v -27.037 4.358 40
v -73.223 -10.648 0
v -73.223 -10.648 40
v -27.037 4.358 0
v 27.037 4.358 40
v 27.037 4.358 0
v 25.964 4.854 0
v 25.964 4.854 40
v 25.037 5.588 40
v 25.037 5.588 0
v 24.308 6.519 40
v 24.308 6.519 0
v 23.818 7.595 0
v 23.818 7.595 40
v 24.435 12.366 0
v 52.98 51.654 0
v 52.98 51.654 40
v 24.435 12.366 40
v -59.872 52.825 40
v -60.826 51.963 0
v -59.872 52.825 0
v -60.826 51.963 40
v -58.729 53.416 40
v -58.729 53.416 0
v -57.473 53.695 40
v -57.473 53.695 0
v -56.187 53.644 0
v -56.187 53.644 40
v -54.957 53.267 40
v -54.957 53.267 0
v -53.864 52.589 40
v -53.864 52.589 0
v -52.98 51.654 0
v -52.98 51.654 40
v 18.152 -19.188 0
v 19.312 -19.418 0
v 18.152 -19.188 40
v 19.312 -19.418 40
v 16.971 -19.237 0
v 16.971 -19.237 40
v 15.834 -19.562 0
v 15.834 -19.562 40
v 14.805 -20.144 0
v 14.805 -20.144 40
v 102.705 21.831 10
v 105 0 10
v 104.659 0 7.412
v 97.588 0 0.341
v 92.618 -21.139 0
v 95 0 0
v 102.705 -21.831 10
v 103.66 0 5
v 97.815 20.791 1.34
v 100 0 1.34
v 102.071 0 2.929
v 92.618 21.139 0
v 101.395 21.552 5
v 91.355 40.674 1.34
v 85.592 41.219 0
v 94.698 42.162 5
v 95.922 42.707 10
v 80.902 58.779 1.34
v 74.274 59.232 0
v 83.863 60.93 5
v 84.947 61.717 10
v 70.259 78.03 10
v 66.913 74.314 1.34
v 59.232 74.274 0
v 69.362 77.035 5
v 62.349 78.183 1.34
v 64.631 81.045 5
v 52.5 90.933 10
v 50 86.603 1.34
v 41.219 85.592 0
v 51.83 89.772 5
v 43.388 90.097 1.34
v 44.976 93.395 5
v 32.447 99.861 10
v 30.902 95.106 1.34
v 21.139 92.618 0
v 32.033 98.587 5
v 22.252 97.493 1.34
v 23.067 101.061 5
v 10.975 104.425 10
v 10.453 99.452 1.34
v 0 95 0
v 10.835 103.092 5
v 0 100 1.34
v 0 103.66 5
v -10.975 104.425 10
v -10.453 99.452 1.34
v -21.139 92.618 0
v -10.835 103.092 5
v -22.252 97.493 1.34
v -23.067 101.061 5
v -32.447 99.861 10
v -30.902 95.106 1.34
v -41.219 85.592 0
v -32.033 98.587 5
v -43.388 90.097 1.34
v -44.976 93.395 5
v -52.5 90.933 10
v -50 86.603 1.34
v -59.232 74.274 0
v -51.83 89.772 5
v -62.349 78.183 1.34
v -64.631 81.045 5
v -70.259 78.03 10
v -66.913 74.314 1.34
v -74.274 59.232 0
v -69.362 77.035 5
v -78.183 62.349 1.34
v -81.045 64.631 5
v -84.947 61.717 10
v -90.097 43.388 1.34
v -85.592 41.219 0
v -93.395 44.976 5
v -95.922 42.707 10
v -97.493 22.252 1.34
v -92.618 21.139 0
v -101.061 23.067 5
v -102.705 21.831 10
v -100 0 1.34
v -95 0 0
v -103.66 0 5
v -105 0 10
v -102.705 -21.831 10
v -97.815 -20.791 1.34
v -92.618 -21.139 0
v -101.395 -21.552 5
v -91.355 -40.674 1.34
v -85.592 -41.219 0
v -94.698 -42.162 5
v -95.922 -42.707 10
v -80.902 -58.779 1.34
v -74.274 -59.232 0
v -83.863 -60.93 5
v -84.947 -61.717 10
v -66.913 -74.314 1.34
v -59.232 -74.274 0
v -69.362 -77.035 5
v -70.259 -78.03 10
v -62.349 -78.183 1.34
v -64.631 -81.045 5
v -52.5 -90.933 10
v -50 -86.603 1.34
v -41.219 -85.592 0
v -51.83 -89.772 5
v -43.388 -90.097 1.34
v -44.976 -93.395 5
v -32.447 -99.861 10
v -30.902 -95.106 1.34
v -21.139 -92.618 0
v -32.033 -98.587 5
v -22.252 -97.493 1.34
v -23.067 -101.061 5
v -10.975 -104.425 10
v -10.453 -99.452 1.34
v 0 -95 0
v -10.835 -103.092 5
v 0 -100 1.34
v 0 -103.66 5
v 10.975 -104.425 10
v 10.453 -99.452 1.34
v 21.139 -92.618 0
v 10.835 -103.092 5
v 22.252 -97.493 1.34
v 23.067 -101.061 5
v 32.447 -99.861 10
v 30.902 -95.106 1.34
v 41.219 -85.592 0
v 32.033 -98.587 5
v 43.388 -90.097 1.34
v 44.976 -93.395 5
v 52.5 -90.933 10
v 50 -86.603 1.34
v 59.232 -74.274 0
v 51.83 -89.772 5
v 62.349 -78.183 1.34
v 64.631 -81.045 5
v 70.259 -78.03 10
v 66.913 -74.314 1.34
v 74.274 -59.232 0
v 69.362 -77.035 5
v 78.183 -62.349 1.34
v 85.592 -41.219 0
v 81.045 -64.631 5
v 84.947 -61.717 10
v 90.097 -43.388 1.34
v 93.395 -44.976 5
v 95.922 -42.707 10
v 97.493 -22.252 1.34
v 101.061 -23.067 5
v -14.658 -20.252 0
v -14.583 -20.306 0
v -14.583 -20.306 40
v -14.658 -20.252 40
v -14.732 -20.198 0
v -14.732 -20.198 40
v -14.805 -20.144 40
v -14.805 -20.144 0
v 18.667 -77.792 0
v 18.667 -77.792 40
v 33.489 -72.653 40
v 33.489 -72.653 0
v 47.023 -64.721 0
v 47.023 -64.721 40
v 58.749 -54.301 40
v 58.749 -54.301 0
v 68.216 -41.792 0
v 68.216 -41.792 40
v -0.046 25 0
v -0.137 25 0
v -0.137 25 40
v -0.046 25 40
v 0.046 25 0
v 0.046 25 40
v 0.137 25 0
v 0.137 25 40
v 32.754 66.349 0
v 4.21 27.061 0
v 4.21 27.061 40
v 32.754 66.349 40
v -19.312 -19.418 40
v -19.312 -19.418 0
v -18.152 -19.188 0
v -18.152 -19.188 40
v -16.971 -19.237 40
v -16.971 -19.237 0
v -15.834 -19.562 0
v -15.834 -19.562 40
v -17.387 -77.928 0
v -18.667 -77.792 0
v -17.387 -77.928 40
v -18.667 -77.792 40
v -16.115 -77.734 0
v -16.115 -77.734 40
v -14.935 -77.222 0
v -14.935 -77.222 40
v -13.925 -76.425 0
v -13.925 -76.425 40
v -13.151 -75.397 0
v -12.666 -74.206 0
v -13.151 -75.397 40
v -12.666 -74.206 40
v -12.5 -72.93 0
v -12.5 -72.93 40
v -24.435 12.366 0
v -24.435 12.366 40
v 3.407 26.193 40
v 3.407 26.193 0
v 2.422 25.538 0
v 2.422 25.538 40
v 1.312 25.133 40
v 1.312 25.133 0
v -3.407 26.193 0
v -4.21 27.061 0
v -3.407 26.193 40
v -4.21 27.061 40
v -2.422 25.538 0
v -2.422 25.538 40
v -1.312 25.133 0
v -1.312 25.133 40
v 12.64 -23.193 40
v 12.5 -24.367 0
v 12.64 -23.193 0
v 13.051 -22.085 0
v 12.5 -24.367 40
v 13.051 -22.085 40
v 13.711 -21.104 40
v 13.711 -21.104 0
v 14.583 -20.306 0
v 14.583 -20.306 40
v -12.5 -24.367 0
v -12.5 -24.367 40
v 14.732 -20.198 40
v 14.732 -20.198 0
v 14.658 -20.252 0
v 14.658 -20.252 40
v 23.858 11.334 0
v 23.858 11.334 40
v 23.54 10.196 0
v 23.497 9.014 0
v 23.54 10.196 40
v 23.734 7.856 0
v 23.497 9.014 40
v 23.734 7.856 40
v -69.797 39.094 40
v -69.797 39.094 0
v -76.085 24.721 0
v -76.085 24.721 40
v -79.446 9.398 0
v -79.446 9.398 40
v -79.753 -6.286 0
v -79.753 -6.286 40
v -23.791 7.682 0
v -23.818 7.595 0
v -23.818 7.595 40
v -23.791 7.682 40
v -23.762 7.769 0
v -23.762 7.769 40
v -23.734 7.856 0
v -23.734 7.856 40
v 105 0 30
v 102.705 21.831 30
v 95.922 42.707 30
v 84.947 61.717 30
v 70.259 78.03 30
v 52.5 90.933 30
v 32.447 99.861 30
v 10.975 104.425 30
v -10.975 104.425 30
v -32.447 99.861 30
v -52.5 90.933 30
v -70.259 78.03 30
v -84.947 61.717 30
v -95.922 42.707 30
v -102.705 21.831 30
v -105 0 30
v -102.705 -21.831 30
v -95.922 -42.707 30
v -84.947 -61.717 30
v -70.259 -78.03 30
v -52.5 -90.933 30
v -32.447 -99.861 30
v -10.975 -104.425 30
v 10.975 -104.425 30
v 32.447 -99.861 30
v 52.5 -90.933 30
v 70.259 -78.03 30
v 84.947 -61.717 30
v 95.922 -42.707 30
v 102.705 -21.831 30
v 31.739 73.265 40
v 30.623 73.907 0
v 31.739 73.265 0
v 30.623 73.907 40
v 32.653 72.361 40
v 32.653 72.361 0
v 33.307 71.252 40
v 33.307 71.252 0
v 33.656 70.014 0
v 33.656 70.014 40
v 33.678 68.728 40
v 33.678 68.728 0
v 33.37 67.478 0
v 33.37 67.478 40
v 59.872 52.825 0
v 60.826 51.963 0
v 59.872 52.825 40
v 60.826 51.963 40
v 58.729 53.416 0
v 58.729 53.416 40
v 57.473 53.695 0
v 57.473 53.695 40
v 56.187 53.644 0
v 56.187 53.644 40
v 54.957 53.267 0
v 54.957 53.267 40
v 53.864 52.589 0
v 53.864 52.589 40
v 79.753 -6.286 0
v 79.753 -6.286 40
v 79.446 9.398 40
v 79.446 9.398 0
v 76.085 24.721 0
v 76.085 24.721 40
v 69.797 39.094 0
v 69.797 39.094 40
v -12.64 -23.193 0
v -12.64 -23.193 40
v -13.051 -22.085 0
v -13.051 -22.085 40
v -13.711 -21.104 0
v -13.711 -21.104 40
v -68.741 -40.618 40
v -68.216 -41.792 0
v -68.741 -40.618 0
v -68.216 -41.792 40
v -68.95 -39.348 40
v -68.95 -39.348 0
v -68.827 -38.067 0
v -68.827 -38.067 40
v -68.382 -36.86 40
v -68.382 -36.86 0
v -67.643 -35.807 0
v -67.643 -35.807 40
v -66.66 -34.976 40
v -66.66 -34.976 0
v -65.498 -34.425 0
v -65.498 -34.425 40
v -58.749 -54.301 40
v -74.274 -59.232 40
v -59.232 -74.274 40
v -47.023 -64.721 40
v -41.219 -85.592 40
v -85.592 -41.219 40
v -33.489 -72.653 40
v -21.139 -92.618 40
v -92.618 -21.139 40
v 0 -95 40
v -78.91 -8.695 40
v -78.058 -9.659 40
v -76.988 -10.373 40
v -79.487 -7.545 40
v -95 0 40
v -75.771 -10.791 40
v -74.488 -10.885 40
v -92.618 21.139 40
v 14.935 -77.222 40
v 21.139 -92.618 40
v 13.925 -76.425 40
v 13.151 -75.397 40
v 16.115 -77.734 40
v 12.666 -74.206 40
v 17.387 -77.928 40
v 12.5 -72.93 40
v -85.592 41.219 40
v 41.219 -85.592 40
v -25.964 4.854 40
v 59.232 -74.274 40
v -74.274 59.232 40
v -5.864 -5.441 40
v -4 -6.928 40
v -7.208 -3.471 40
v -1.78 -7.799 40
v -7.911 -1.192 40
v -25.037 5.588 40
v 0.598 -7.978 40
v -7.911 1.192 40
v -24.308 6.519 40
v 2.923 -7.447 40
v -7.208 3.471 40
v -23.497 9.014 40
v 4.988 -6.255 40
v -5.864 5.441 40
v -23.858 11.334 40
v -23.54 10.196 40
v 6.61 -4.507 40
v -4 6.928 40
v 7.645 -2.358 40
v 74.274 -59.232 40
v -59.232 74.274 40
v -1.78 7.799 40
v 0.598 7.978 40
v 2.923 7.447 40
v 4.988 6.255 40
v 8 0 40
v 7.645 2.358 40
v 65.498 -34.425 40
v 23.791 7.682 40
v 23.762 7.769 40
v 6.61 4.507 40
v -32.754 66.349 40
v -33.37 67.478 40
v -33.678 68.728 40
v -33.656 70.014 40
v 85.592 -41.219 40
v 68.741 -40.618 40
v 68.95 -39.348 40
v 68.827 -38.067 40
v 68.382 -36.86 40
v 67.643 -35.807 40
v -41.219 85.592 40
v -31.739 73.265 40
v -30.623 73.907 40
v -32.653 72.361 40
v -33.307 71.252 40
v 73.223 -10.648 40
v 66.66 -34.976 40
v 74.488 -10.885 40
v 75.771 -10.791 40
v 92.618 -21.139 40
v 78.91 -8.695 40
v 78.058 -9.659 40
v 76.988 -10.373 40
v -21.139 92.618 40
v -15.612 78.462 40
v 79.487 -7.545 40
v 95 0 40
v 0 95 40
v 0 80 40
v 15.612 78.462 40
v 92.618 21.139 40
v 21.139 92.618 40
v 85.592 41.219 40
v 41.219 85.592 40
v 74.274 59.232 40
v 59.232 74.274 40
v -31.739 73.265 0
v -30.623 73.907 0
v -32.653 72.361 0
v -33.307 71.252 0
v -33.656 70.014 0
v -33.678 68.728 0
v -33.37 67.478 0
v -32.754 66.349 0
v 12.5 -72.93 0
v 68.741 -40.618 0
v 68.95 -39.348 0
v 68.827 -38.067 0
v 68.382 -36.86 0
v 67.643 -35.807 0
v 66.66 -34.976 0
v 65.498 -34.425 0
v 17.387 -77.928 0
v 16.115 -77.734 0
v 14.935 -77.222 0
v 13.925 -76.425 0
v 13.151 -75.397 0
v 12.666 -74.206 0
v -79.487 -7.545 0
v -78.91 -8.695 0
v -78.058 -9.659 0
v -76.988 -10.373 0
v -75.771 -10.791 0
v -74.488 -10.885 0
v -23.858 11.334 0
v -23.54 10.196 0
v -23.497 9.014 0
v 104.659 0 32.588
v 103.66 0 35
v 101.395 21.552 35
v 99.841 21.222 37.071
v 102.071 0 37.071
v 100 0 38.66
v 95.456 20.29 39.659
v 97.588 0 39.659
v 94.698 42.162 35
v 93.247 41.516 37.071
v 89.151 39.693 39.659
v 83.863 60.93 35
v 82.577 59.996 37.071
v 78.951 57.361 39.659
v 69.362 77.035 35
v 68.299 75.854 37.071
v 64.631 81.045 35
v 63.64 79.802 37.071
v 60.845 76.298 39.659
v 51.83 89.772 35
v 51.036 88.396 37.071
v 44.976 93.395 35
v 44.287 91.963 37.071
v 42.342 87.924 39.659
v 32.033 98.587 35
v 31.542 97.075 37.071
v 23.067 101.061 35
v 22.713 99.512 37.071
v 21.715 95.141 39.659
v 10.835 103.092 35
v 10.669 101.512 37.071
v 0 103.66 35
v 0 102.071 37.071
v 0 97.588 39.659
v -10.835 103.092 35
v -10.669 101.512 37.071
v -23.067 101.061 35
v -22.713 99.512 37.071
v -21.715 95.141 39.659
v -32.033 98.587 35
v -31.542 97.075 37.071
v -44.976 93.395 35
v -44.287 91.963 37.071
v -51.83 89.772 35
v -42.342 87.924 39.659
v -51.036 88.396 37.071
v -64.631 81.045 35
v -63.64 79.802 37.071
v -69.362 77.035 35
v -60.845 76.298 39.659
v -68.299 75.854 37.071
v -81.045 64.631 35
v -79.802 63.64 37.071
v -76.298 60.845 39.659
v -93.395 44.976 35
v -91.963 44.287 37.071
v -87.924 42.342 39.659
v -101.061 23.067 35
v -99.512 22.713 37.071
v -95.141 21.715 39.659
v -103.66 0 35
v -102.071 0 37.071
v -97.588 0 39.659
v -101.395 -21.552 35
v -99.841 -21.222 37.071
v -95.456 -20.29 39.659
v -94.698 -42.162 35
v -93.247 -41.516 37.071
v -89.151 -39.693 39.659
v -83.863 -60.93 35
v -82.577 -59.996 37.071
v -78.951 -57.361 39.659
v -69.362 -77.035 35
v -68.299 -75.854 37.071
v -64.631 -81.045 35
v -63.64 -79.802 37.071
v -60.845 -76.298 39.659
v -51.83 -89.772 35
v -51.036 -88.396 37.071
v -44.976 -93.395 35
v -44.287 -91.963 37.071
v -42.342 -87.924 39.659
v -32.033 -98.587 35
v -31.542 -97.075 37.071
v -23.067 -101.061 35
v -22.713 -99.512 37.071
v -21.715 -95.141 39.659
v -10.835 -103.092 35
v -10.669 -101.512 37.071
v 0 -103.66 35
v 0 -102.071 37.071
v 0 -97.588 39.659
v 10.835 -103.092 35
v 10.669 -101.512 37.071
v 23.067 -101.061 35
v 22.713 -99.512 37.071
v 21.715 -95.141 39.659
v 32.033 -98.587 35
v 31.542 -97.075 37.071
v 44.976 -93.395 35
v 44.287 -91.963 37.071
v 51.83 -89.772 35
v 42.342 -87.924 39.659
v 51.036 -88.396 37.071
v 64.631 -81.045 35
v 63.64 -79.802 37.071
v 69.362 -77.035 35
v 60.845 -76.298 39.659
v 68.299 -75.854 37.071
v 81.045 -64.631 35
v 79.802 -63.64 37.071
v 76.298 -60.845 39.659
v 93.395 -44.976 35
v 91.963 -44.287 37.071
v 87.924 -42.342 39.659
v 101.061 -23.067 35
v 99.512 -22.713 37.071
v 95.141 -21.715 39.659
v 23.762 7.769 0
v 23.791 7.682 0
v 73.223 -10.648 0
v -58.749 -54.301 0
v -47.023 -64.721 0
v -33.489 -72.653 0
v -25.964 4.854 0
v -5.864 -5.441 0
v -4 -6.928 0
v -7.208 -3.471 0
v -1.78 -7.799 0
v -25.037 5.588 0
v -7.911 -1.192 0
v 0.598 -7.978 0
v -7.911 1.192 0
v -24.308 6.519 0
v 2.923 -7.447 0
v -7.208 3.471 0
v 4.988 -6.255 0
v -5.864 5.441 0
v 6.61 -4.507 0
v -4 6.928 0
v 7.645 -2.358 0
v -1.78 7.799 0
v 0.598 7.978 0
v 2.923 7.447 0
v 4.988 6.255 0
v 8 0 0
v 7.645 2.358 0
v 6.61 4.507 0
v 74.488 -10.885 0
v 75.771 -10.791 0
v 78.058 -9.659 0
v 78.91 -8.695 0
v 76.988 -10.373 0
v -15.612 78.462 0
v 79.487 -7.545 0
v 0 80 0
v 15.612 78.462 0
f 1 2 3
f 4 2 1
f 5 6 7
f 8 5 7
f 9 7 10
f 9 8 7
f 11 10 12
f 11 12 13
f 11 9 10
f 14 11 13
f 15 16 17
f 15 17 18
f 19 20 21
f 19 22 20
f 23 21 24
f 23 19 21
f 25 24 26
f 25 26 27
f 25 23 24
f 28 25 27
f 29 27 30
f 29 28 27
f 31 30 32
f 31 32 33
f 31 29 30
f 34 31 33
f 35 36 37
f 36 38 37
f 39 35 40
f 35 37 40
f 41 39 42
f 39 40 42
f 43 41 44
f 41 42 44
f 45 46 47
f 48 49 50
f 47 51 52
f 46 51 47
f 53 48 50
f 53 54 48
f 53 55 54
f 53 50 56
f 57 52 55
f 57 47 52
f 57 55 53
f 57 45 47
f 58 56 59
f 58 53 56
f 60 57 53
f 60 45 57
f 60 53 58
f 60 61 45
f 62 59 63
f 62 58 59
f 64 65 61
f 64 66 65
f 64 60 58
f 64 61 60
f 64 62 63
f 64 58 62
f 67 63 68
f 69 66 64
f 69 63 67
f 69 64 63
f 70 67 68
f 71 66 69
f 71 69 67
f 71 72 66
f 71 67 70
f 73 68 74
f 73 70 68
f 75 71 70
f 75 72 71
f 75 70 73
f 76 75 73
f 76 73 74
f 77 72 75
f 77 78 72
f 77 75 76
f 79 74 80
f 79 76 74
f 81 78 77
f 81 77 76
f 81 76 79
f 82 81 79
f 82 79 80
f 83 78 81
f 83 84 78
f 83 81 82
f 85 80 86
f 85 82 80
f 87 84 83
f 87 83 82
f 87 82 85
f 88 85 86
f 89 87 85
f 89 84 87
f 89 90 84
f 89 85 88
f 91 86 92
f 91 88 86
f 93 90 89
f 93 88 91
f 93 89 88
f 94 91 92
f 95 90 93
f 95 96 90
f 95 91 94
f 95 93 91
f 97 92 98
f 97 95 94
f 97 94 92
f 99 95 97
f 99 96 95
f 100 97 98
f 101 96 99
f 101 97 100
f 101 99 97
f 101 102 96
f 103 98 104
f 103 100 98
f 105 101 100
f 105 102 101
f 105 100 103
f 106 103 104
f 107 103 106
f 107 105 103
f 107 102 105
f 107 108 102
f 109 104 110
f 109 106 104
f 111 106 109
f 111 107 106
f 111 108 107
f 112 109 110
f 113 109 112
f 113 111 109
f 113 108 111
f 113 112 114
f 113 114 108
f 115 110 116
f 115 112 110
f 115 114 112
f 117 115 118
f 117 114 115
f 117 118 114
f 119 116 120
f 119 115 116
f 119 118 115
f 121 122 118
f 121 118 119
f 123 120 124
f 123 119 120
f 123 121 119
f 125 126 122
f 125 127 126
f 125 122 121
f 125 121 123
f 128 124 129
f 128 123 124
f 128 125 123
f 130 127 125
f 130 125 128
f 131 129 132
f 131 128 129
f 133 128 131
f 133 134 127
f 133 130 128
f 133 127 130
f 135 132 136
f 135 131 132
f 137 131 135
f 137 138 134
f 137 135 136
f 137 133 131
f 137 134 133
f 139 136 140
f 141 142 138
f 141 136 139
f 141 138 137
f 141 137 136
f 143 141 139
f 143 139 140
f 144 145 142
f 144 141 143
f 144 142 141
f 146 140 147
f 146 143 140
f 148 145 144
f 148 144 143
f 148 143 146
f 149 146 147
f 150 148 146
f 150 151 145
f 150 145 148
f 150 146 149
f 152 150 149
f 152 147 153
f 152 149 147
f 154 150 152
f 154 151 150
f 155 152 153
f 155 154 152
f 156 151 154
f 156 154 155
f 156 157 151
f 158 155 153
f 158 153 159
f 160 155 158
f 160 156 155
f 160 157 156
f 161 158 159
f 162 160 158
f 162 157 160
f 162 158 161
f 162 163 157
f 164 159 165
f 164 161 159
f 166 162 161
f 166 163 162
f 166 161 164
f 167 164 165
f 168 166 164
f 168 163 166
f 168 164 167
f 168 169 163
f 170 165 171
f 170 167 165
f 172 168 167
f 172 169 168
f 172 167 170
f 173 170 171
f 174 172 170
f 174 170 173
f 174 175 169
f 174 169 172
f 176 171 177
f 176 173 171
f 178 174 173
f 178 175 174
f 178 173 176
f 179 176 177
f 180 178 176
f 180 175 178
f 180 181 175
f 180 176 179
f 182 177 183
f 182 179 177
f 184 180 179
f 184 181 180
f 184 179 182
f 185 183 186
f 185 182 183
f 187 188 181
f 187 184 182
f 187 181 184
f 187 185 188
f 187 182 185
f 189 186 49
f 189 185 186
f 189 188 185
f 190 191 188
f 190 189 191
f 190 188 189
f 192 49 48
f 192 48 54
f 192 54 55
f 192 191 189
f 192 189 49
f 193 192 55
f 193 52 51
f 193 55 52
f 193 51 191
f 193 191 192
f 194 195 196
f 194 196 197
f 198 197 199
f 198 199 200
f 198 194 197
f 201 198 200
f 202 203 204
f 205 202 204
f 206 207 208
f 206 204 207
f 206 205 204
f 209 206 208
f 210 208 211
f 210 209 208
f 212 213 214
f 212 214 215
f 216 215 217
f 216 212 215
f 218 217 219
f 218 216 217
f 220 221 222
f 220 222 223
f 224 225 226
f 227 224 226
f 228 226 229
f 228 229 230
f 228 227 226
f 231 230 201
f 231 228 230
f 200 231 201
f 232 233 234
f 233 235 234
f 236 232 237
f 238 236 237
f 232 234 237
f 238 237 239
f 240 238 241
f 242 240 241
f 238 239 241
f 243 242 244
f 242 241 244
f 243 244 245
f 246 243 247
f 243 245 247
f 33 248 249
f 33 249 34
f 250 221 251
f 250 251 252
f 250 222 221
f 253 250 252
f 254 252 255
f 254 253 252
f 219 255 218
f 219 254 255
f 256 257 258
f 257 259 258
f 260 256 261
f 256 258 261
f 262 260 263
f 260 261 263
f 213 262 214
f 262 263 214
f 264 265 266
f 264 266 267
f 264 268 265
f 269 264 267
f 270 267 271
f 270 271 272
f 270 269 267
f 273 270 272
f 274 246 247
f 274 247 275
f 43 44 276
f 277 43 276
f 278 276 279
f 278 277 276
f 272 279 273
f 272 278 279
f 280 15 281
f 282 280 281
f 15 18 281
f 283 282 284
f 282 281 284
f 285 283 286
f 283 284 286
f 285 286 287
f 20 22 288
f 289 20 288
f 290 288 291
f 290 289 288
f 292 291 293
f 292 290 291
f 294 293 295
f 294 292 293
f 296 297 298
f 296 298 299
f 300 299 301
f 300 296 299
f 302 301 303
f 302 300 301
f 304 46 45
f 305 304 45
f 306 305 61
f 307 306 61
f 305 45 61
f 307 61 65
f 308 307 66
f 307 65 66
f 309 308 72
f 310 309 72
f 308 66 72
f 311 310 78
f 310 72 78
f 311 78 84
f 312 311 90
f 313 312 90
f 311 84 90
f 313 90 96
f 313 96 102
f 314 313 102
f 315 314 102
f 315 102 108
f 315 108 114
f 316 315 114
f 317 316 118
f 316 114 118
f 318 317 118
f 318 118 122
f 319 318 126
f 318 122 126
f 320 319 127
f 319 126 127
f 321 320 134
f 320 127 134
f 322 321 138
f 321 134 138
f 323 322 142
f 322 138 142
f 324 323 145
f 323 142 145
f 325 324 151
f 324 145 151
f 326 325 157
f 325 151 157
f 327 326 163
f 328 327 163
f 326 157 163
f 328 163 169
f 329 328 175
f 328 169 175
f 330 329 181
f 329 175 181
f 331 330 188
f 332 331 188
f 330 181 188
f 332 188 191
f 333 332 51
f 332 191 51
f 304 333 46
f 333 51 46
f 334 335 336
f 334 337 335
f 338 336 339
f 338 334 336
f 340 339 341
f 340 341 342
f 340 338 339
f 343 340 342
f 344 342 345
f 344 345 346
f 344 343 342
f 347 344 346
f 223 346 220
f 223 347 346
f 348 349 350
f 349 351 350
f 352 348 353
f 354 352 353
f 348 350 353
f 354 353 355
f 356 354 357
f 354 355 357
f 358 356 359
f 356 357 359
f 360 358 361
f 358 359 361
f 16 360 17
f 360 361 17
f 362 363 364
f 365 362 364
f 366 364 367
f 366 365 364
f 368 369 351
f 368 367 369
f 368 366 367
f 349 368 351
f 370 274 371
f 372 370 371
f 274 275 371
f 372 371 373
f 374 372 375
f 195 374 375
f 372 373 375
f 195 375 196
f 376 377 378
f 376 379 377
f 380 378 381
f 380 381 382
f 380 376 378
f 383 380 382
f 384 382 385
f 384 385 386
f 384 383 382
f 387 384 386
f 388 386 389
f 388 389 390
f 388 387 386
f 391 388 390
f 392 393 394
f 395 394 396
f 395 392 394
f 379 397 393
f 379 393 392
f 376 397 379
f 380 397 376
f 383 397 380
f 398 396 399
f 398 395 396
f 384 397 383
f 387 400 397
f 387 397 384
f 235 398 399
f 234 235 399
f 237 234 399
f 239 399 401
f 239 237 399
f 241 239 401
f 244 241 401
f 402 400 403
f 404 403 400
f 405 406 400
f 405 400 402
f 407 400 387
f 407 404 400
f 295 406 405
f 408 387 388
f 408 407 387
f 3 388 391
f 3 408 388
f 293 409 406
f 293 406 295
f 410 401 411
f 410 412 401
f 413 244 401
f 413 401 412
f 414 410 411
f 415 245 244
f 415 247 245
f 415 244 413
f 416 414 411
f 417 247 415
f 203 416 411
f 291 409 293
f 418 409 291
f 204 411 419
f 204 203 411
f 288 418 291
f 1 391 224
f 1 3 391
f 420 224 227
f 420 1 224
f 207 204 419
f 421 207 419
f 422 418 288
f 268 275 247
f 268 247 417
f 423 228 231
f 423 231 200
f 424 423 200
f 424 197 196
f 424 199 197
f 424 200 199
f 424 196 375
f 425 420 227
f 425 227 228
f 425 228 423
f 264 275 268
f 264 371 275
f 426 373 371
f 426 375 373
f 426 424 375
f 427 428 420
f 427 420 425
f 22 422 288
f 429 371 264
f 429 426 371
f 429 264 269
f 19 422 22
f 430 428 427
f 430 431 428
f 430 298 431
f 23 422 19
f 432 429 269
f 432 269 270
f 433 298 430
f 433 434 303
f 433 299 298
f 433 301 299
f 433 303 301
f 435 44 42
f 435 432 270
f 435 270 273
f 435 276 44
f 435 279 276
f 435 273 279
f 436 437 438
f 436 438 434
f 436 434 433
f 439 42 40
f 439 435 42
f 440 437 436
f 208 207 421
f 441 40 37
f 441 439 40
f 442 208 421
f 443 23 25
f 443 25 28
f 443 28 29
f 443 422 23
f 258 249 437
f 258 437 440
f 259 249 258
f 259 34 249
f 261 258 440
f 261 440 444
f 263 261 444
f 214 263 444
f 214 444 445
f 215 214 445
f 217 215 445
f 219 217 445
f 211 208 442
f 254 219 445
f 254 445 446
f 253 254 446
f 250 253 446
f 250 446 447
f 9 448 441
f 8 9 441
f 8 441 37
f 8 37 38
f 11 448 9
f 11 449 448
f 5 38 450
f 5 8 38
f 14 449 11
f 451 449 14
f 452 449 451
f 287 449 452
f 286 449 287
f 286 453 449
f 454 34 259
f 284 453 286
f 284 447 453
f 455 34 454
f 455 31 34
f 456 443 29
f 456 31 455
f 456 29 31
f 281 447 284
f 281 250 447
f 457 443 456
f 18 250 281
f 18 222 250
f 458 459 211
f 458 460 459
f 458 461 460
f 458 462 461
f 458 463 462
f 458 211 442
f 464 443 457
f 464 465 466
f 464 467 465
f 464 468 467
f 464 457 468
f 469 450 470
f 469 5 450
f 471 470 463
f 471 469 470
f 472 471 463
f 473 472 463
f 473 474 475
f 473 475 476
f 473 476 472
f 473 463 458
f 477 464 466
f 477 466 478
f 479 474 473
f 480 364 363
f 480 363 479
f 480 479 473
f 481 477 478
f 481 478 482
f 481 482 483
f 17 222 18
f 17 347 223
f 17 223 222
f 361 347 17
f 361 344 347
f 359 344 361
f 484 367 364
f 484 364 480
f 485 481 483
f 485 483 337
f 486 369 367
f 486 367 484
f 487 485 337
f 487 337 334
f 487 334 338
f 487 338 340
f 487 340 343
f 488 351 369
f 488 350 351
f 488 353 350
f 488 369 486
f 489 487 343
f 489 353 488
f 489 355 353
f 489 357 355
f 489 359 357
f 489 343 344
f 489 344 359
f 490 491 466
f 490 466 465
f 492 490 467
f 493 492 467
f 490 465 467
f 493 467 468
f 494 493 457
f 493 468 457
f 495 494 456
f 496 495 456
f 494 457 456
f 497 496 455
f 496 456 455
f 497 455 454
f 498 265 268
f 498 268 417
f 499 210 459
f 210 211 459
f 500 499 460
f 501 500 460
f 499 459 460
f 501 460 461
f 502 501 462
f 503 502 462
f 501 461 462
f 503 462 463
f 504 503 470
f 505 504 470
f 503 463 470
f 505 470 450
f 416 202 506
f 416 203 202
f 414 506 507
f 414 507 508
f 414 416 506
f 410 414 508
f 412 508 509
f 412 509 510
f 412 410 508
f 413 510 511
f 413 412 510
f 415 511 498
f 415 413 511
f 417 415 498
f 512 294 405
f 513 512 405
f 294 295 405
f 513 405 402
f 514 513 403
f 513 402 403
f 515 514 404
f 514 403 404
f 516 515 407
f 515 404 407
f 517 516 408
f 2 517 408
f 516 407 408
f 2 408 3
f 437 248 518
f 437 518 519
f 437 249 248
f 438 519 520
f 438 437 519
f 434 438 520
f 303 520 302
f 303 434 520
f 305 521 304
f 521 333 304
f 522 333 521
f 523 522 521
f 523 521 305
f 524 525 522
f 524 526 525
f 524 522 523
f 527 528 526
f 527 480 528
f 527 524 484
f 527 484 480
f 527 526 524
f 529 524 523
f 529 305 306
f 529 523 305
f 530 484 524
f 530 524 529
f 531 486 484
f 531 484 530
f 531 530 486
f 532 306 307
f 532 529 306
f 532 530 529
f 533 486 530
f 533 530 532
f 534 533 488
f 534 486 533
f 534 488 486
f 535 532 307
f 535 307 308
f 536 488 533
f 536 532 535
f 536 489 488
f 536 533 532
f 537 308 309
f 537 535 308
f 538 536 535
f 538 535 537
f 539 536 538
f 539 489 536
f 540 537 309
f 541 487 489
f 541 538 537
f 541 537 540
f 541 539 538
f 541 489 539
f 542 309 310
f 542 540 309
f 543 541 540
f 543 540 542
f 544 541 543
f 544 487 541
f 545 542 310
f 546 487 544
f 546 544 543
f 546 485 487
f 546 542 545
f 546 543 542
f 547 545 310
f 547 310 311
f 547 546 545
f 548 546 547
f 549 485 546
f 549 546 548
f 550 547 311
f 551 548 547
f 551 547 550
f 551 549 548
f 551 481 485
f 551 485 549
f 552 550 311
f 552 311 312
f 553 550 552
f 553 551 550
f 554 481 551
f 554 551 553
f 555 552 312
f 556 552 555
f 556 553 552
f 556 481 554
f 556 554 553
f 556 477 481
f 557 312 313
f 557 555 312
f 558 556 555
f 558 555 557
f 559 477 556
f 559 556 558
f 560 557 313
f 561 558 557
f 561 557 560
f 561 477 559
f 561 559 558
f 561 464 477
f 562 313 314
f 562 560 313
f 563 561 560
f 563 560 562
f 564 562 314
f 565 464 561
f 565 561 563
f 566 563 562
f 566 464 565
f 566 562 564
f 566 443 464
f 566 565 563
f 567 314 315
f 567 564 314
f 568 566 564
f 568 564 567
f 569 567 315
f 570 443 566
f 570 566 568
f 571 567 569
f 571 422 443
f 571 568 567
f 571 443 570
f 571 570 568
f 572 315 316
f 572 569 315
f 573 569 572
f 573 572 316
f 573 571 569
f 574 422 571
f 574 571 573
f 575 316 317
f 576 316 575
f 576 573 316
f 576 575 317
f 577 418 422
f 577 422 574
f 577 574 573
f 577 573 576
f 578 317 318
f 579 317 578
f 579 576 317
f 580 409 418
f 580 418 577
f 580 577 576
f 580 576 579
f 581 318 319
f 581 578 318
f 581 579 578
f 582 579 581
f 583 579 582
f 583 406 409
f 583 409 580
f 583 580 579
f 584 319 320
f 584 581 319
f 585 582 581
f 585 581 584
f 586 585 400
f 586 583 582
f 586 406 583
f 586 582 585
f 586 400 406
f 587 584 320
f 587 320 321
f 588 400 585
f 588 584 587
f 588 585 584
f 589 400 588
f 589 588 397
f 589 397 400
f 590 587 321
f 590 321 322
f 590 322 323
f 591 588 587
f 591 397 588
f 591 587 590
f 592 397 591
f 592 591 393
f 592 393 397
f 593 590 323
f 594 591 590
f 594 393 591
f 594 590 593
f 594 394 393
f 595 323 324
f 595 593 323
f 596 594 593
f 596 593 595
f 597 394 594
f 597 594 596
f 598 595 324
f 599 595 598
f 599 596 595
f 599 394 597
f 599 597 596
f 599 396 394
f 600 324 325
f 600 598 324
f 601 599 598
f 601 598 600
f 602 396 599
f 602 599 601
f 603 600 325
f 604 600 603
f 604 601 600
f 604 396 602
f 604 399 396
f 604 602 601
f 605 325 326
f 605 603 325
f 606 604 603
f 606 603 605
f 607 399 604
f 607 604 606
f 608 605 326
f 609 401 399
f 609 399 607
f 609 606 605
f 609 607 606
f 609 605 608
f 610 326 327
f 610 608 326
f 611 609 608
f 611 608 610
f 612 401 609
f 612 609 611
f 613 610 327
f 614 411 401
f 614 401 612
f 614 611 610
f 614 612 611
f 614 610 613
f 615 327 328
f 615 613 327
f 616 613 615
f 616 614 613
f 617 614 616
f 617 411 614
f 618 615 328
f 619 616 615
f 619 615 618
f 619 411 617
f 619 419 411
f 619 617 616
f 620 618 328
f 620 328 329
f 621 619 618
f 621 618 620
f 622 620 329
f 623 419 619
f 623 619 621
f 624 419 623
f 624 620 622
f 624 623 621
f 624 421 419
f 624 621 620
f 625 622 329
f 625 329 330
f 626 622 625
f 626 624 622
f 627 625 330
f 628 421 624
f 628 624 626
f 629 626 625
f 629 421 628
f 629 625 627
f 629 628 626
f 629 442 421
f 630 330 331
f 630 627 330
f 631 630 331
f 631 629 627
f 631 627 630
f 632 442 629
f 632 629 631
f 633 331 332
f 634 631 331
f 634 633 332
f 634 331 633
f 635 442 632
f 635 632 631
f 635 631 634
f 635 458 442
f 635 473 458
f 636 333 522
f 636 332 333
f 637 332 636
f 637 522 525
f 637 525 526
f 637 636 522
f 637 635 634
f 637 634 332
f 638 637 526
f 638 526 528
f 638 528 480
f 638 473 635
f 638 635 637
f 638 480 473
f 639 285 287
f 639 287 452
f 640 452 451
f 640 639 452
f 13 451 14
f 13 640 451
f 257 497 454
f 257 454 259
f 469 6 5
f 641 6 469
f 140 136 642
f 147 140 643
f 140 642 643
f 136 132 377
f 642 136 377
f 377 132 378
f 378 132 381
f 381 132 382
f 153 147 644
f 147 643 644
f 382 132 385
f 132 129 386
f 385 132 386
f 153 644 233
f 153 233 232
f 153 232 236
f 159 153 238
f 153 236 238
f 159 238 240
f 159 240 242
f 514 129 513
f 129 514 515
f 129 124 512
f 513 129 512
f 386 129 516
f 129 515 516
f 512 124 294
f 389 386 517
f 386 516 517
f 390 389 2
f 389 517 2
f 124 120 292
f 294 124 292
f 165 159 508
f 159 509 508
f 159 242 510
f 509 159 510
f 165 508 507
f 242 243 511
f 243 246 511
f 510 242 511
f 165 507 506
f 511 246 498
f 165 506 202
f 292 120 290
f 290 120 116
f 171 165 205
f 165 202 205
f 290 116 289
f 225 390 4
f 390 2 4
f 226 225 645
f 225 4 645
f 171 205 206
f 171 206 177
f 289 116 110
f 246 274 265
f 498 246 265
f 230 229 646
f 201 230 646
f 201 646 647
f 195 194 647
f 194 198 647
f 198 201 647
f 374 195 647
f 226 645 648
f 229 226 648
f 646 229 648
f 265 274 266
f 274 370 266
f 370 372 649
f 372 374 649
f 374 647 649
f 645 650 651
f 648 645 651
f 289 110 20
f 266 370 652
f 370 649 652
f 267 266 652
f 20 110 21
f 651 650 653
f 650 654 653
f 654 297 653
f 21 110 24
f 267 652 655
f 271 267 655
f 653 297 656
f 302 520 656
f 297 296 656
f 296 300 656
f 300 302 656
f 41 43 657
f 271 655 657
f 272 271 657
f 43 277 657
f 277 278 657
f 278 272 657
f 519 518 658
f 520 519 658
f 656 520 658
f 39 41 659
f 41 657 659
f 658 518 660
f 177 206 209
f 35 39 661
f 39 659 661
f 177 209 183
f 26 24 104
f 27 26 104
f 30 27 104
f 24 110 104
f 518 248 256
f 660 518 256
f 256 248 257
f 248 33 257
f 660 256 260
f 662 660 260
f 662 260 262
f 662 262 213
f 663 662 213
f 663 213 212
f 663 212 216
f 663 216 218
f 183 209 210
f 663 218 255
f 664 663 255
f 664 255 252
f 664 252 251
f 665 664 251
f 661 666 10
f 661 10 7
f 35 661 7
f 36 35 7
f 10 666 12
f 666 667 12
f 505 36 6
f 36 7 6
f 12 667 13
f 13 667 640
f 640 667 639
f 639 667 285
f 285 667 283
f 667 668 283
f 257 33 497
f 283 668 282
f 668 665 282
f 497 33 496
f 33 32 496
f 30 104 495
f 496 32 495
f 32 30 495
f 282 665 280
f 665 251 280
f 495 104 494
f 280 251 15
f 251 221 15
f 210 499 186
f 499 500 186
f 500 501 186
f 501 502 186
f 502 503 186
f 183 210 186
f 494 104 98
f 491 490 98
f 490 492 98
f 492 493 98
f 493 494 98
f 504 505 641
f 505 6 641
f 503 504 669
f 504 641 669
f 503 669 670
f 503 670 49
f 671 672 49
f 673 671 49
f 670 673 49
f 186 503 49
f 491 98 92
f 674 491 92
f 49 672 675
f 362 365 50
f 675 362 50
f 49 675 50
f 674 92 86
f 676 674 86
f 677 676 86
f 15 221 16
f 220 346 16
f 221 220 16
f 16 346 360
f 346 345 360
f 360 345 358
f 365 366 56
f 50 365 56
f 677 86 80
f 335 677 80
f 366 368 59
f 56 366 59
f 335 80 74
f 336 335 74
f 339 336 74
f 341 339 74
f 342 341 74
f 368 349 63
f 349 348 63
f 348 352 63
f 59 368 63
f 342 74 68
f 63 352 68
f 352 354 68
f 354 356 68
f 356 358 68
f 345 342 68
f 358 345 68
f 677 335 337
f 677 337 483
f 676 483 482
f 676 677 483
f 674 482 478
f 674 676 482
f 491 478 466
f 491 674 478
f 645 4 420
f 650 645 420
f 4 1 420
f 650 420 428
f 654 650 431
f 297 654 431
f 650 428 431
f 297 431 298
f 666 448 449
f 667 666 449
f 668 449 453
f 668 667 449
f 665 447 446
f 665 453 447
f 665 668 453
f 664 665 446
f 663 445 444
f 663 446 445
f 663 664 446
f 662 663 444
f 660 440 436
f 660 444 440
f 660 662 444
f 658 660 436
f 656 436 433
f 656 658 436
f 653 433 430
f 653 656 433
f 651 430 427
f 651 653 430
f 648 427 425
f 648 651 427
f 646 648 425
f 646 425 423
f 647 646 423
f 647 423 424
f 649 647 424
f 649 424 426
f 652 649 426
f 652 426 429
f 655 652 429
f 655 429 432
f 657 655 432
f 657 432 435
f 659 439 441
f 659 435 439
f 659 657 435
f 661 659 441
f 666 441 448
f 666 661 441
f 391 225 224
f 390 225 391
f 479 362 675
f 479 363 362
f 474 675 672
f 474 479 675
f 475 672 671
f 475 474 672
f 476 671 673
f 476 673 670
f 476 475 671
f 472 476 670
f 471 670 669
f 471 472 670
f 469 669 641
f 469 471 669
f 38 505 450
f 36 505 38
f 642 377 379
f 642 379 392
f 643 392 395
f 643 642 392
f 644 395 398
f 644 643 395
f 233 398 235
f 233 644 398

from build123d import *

# Parameters (mm, degrees)
ESQUISSE1_R                  = 105
BOSS_EXTRU_1_DEPTH           = 40
ENL_V_MAT_EXTRU_1_DEPTH      = 154.785564992
ENL_V_MAT_EXTRU_1_DEPTH_BACK = 154.785564992
ENL_V_MAT_EXTRU_2_DEPTH      = 154.785564992
ENL_V_MAT_EXTRU_2_DEPTH_BACK = 154.785564992
ESQUISSE3_R                  = 8
CONG_1_R                     = 5
CONG_2_R                     = 10


with BuildPart() as part:
    # Esquisse1 → Boss.-Extru.1 (new body)
    with BuildSketch(Plane.XY):
        Circle(ESQUISSE1_R)
    extrude(amount=BOSS_EXTRU_1_DEPTH)

    # Esquisse2 → Enlèv. mat.-Extru.1 (cut, two sides: drawn at the far end of the back side and taken through both)
    with BuildSketch(Plane.XY.offset(40).offset(-ENL_V_MAT_EXTRU_1_DEPTH_BACK)):
        with BuildLine():
            Line((2.613211582, 24.863047384), (36.332551814, 71.27373765))
            ThreePointArc((36.332551814, 71.27373765), (0, 80), (-36.332551814, 71.27373765))
            Line((-36.332551814, 71.27373765), (-2.613211582, 24.863047384))
            ThreePointArc((-2.613211582, 24.863047384), (0, 25), (2.613211582, 24.863047384))
        make_face()
        with BuildLine():
            Line((24.453690018, 5.19779227), (79.012728593, -12.52951397))
            ThreePointArc((79.012728593, -12.52951397), (76.084521304, 24.72135955), (56.557976674, 56.579106343))
            Line((56.557976674, 56.579106343), (22.838636441, 10.168416077))
            ThreePointArc((22.838636441, 10.168416077), (23.776412907, 7.725424859), (24.453690018, 5.19779227))
        make_face()
        with BuildLine():
            Line((12.5, -21.650635095), (12.5, -79.017403146))
            ThreePointArc((12.5, -79.017403146), (47.022820183, -64.72135955), (71.287303733, -36.305926877))
            Line((71.287303733, -36.305926877), (16.728265159, -18.578620637))
            ThreePointArc((16.728265159, -18.578620637), (14.694631307, -20.225424859), (12.5, -21.650635095))
        make_face()
        with BuildLine():
            Line((-16.728265159, -18.578620637), (-71.287303733, -36.305926877))
            ThreePointArc((-71.287303733, -36.305926877), (-47.022820183, -64.72135955), (-12.5, -79.017403146))
            Line((-12.5, -79.017403146), (-12.5, -21.650635095))
            ThreePointArc((-12.5, -21.650635095), (-14.694631307, -20.225424859), (-16.728265159, -18.578620637))
        make_face()
        with BuildLine():
            Line((-22.838636441, 10.168416077), (-56.557976674, 56.579106343))
            ThreePointArc((-56.557976674, 56.579106343), (-76.084521304, 24.72135955), (-79.012728593, -12.52951397))
            Line((-79.012728593, -12.52951397), (-24.453690018, 5.19779227))
            ThreePointArc((-24.453690018, 5.19779227), (-23.776412907, 7.725424859), (-22.838636441, 10.168416077))
        make_face()
    extrude(amount=ENL_V_MAT_EXTRU_1_DEPTH + ENL_V_MAT_EXTRU_1_DEPTH_BACK, mode=Mode.SUBTRACT)

    # Esquisse3 → Enlèv. mat.-Extru.2 (cut, two sides: drawn at the far end of the back side and taken through both)
    with BuildSketch(Plane.XY.offset(40).offset(-ENL_V_MAT_EXTRU_2_DEPTH_BACK)):
        Circle(ESQUISSE3_R)
    extrude(amount=ENL_V_MAT_EXTRU_2_DEPTH + ENL_V_MAT_EXTRU_2_DEPTH_BACK, mode=Mode.SUBTRACT)

    # Congé1
    cong_1_edges = [part.edges().sort_by_distance(p)[0] for p in [
        (-79.012728593, -12.52951397, 20),
        (-56.557976674, 56.579106343, 20),
        (-22.838636441, 10.168416077, 20),
        (-24.453690018, 5.19779227, 20),
        (-12.5, -79.017403146, 20),
        (-71.287303733, -36.305926877, 20),
        (-16.728265159, -18.578620637, 20),
        (-12.5, -21.650635095, 20),
        (71.287303733, -36.305926877, 20),
        (12.5, -79.017403146, 20),
        (12.5, -21.650635095, 20),
        (16.728265159, -18.578620637, 20),
        (56.557976674, 56.579106343, 20),
        (79.012728593, -12.52951397, 20),
        (24.453690018, 5.19779227, 20),
        (22.838636441, 10.168416077, 20),
        (-36.332551814, 71.27373765, 20),
        (36.332551814, 71.27373765, 20),
        (2.613211582, 24.863047384, 20),
        (-2.613211582, 24.863047384, 20),
    ]]
    fillet(cong_1_edges, radius=CONG_1_R)

    # Congé2
    cong_2_edges = [part.edges().sort_by_distance(p)[0] for p in [
        (-105, 0, 0),
        (-105, 0, 40),
    ]]
    fillet(cong_2_edges, radius=CONG_2_R)


solid = part.part
